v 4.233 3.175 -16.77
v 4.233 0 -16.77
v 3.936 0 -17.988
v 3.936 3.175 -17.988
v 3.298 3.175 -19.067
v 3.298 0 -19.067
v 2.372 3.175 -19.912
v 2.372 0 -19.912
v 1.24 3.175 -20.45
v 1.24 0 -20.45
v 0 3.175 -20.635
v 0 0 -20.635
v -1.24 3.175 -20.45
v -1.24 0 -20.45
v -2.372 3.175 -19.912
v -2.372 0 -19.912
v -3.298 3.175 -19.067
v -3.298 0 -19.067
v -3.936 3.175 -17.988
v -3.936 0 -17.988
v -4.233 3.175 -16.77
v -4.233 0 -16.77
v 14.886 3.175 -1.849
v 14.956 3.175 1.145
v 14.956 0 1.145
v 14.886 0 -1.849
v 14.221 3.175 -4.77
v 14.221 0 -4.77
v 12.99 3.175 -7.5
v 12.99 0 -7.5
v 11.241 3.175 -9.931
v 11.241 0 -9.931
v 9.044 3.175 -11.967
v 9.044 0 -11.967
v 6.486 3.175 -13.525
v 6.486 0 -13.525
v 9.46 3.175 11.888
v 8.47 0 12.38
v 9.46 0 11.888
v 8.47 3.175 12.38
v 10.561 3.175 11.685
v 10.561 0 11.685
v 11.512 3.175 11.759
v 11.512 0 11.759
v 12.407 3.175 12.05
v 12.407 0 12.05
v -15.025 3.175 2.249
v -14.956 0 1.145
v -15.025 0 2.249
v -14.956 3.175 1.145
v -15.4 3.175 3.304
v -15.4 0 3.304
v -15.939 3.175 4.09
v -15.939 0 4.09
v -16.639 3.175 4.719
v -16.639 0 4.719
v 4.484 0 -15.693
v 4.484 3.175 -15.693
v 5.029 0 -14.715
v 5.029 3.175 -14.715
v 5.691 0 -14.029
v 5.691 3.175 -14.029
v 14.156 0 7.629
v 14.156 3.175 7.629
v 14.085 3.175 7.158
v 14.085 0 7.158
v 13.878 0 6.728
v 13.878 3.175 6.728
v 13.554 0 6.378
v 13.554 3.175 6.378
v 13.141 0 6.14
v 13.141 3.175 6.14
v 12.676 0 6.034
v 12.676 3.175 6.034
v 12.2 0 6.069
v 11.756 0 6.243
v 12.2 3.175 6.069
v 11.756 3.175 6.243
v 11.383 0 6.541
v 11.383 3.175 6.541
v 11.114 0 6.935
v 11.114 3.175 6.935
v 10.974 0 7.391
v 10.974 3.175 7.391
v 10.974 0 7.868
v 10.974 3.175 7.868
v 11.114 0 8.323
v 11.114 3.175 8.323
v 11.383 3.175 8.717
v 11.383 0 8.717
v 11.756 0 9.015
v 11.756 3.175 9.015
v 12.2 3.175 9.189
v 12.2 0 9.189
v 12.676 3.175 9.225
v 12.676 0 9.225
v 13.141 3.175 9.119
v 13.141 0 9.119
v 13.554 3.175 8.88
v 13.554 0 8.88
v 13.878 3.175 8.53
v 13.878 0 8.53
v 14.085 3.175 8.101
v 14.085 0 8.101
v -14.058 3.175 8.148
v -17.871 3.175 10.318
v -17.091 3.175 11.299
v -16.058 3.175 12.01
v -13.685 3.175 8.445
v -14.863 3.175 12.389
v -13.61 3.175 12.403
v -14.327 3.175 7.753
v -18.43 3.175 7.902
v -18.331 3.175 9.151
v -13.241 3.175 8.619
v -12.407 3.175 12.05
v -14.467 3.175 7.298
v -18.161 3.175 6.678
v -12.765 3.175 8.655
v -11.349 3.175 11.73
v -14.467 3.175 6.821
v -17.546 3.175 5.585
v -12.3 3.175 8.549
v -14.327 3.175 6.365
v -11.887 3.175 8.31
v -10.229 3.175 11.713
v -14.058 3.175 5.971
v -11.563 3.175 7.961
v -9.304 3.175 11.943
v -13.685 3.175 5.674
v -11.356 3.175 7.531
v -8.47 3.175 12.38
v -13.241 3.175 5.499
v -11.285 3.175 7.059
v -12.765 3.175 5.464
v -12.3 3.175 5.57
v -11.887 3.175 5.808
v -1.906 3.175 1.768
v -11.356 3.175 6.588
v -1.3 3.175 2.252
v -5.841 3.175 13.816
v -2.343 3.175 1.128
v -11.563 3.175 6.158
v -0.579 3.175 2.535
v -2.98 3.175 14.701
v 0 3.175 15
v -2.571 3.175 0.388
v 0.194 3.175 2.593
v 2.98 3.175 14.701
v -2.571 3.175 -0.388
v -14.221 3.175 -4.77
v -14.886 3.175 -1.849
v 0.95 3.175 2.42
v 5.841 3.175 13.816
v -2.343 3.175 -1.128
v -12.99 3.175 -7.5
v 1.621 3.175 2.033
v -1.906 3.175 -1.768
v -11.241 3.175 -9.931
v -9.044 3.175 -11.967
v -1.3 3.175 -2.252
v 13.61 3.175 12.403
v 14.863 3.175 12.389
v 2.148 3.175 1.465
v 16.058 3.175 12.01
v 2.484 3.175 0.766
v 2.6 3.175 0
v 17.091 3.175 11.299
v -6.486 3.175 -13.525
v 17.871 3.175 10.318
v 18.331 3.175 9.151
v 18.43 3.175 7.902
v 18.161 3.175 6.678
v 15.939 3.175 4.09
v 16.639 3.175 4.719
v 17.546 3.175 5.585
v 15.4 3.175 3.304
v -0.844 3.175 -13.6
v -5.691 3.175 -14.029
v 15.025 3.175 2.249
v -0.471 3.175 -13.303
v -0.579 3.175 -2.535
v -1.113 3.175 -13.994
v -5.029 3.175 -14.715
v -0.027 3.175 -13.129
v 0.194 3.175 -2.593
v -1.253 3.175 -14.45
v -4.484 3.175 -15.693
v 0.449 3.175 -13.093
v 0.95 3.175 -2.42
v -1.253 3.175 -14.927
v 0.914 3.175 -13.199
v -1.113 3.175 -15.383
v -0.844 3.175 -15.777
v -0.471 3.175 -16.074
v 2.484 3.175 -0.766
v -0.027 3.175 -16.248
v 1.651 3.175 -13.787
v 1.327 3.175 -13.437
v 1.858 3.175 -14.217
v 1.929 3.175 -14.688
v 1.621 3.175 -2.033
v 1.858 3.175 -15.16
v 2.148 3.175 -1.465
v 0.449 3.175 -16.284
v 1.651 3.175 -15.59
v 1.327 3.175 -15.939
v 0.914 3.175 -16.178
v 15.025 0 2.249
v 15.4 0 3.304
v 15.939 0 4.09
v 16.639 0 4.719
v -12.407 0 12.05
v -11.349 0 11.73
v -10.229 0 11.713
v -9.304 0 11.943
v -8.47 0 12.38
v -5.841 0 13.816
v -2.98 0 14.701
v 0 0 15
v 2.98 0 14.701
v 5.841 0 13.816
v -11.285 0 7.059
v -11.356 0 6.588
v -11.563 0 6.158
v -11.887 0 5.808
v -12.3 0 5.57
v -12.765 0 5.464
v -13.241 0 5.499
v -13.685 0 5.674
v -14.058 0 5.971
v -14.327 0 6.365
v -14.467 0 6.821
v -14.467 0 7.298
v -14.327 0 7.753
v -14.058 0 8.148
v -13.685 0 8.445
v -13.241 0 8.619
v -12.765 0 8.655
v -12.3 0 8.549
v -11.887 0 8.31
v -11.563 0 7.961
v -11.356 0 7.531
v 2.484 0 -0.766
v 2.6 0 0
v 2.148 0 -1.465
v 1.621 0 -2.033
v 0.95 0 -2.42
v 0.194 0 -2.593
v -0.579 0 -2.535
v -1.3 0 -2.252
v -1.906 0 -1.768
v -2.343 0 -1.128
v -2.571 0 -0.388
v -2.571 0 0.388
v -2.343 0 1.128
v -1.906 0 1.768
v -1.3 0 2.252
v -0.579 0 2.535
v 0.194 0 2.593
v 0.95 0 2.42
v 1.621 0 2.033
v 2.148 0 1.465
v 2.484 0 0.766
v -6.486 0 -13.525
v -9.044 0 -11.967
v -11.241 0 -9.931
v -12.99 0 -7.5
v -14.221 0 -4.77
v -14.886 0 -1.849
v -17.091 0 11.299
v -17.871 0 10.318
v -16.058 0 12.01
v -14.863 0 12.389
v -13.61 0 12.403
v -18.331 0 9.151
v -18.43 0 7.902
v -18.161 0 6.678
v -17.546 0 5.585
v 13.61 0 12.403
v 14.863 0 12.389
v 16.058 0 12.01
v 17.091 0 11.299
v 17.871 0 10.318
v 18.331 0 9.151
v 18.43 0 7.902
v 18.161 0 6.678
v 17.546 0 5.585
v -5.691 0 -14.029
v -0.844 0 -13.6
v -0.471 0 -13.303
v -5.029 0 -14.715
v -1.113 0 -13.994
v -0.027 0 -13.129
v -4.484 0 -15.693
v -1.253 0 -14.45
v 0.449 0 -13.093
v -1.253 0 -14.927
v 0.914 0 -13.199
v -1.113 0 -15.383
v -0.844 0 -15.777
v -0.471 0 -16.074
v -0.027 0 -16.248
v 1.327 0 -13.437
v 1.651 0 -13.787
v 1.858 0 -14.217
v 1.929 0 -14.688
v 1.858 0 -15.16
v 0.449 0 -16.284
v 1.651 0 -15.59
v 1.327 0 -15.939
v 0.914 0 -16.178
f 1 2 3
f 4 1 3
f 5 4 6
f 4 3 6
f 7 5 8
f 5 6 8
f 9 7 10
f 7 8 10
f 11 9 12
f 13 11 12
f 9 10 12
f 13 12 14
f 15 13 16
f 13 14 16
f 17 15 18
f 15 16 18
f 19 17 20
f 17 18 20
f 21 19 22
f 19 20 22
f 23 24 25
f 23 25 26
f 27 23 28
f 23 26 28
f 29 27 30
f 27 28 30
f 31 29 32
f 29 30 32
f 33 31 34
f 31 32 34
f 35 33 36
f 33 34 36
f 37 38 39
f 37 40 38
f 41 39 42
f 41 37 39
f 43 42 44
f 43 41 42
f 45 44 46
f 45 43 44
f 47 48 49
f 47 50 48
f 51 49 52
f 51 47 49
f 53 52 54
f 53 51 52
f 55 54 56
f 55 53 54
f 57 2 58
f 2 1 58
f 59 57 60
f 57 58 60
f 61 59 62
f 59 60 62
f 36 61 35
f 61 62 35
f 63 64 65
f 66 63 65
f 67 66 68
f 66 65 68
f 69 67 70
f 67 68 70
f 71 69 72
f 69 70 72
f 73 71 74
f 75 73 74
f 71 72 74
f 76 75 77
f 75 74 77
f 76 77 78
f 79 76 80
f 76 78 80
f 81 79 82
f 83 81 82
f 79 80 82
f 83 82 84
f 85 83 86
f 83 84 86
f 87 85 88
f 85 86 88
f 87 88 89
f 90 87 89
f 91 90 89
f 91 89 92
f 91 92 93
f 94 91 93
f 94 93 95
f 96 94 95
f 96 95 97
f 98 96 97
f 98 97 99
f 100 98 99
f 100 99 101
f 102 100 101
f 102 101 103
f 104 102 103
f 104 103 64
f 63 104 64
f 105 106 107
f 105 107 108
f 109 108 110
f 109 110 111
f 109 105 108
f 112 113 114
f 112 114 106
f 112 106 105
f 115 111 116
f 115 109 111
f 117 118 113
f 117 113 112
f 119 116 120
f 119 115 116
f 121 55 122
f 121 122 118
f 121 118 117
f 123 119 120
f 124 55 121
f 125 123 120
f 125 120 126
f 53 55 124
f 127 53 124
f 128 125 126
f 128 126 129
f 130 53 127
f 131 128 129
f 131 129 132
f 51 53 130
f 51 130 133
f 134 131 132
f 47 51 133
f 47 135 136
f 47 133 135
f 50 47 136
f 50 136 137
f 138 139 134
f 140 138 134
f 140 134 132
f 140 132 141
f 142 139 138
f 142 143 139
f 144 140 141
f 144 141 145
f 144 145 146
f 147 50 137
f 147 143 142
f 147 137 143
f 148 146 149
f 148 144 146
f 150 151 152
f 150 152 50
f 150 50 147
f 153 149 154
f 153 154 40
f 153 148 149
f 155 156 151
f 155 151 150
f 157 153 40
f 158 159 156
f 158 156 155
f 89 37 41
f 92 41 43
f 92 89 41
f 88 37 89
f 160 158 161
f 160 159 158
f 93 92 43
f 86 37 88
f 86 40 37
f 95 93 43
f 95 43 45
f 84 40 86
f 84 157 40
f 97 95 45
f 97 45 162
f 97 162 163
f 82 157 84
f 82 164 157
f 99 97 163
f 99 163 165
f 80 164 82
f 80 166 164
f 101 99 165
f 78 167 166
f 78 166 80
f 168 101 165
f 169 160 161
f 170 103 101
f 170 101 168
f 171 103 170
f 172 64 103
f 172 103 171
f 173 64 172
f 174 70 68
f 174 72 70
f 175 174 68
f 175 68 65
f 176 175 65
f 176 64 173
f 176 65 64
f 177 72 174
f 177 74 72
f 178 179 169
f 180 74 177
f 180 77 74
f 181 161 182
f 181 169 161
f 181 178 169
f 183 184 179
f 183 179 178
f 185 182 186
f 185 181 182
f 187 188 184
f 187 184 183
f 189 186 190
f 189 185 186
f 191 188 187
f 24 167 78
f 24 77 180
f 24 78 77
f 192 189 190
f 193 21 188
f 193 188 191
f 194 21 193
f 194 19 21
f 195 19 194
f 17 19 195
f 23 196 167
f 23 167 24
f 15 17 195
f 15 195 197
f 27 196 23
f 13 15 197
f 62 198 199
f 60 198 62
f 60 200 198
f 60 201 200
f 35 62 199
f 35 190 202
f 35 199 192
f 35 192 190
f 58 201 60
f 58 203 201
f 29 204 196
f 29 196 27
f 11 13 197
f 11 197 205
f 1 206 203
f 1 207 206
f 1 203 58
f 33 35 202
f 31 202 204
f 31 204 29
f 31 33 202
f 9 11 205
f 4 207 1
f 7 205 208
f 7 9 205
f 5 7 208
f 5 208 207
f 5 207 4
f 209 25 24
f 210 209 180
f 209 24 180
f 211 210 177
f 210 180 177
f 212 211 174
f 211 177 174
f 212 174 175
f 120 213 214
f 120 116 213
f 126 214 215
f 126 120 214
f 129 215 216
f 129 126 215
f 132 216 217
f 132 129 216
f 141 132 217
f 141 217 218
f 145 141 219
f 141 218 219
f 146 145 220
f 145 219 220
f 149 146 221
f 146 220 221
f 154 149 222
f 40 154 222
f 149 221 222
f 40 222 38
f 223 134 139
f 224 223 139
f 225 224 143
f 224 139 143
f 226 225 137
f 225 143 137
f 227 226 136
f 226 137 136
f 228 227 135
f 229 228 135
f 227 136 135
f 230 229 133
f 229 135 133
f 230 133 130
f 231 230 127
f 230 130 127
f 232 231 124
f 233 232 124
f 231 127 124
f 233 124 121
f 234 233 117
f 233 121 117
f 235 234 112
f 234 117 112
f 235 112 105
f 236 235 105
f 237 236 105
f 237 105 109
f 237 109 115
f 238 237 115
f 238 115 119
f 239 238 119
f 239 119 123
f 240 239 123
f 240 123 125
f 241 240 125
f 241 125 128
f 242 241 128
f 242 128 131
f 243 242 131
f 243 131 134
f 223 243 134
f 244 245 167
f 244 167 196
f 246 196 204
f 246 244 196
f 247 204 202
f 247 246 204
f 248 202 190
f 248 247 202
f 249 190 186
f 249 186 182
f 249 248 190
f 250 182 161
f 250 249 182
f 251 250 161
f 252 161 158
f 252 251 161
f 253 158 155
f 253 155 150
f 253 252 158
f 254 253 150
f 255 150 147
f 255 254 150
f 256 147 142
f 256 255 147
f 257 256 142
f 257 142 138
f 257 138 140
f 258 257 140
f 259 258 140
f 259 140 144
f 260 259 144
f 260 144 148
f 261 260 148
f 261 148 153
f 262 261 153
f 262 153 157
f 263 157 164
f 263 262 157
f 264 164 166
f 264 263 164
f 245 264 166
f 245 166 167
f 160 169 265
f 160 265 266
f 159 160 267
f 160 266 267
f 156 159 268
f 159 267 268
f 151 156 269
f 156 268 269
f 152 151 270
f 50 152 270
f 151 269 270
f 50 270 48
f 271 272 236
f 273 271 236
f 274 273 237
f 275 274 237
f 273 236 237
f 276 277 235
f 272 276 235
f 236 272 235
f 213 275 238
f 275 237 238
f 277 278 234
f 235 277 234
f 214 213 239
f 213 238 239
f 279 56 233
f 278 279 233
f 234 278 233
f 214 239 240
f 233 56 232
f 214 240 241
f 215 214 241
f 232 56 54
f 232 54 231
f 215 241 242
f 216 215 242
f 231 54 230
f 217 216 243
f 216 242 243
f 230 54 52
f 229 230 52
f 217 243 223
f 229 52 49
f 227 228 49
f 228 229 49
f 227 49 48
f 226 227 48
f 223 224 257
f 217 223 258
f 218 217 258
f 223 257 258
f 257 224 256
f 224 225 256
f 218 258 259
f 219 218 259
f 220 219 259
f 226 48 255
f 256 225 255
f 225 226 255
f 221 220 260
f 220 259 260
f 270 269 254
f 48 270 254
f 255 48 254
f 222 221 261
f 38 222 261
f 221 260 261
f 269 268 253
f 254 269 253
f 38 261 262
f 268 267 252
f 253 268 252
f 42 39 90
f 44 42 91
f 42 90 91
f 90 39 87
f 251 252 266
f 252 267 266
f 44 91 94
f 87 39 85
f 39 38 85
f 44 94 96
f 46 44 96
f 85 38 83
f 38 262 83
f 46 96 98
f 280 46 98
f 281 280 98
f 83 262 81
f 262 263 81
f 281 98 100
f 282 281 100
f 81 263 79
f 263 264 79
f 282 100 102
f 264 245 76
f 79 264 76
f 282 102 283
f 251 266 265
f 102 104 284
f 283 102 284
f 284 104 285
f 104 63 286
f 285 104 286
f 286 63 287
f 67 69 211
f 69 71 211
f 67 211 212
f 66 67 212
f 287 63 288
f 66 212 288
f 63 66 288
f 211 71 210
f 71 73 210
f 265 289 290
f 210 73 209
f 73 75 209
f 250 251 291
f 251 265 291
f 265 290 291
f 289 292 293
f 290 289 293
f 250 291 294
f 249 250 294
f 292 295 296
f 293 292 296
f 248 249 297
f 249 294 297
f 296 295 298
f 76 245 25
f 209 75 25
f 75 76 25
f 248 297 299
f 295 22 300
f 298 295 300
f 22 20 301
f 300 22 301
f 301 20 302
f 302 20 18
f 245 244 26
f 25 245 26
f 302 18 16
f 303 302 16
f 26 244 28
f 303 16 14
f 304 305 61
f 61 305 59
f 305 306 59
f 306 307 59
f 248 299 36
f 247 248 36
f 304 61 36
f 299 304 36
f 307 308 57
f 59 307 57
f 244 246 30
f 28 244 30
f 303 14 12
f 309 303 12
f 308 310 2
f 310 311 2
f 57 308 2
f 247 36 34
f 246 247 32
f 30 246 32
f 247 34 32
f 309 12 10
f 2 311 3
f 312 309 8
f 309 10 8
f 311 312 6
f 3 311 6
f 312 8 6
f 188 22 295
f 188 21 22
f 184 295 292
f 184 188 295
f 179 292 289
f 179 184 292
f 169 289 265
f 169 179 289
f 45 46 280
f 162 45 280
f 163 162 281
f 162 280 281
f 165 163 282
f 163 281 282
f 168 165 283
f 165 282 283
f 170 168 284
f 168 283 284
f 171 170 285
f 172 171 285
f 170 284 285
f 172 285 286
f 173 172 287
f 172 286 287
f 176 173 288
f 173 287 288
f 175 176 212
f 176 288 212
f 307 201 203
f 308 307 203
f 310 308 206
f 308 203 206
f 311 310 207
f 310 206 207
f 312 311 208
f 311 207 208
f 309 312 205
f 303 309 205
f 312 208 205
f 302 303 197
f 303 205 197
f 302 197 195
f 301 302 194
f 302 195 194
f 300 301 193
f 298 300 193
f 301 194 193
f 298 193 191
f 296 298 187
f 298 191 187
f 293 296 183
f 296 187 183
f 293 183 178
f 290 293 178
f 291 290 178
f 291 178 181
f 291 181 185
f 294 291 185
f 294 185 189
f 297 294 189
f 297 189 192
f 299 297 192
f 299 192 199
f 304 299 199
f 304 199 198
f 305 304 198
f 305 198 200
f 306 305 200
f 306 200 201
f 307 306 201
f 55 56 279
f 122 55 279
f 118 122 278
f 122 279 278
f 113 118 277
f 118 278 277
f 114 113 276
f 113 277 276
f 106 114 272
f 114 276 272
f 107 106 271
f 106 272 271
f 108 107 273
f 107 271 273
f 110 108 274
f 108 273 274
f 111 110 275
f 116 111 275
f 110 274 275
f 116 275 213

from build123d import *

# Parameters (mm, degrees)
SKETCH1_R           = 2.6
BOSS_EXTRUDE1_DEPTH = 3.175
FILLET1_R           = 4
SKETCH2_R           = 1.6
CUT_EXTRUDE1_DEPTH  = 4.1750001


with BuildPart() as part:
    # Sketch1 → Boss-Extrude1 (new body)
    with BuildSketch(Plane(origin=(0, 0, 0), x_dir=(1, 0, 0), z_dir=(0, 1, 0))):
        with BuildLine():
            Line((-4.25, 16.385322381), (-4.25, 14.385322381))
            ThreePointArc((-4.25, 14.385322381), (-12.990381057, 7.5), (-14.583054623, -3.512053224))
            Line((-14.583054623, -3.512053224), (-16.315105431, -4.512053224))
            ThreePointArc((-16.315105431, -4.512053224), (-17.870713397, -10.31766119), (-12.065105431, -11.873269156))
            Line((-12.065105431, -11.873269156), (-10.333054623, -10.873269156))
            ThreePointArc((-10.333054623, -10.873269156), (0, -15), (10.333054623, -10.873269156))
            Line((10.333054623, -10.873269156), (12.065105431, -11.873269156))
            ThreePointArc((12.065105431, -11.873269156), (17.870713397, -10.31766119), (16.315105431, -4.512053224))
            Line((16.315105431, -4.512053224), (14.583054623, -3.512053224))
            ThreePointArc((14.583054623, -3.512053224), (12.990381057, 7.5), (4.25, 14.385322381))
            Line((4.25, 14.385322381), (4.25, 16.385322381))
            ThreePointArc((4.25, 16.385322381), (0, 20.635322381), (-4.25, 16.385322381))
        make_face()
        Circle(SKETCH1_R, mode=Mode.SUBTRACT)
    extrude(amount=BOSS_EXTRUDE1_DEPTH)

    # Fillet1
    fillet1_edges = [part.edges().sort_by_distance(p)[0] for p in [
        (-14.583054623, 1.5875, 3.512053224),
        (-4.25, 1.5875, -14.385322381),
        (4.25, 1.5875, -14.385322381),
        (14.583054623, 1.5875, 3.512053224),
        (10.333054623, 1.5875, 10.873269156),
        (-10.333054623, 1.5875, 10.873269156),
    ]]
    fillet(fillet1_edges, radius=FILLET1_R)

    # Sketch2 → Cut-Extrude1 (cut, through all)
    with BuildSketch(Plane(origin=(0, 3.175, 0), x_dir=(1, 0, 0), z_dir=(0, 1, 0))):
        with Locations((-12.88502754, -7.05928361)):
            Circle(SKETCH2_R)
        with Locations((12.556032709, -7.629119373)):
            Circle(SKETCH2_R)
        with Locations((0.328994831, 14.688402983)):
            Circle(SKETCH2_R)
    extrude(amount=-CUT_EXTRUDE1_DEPTH, mode=Mode.SUBTRACT)


solid = part.part
